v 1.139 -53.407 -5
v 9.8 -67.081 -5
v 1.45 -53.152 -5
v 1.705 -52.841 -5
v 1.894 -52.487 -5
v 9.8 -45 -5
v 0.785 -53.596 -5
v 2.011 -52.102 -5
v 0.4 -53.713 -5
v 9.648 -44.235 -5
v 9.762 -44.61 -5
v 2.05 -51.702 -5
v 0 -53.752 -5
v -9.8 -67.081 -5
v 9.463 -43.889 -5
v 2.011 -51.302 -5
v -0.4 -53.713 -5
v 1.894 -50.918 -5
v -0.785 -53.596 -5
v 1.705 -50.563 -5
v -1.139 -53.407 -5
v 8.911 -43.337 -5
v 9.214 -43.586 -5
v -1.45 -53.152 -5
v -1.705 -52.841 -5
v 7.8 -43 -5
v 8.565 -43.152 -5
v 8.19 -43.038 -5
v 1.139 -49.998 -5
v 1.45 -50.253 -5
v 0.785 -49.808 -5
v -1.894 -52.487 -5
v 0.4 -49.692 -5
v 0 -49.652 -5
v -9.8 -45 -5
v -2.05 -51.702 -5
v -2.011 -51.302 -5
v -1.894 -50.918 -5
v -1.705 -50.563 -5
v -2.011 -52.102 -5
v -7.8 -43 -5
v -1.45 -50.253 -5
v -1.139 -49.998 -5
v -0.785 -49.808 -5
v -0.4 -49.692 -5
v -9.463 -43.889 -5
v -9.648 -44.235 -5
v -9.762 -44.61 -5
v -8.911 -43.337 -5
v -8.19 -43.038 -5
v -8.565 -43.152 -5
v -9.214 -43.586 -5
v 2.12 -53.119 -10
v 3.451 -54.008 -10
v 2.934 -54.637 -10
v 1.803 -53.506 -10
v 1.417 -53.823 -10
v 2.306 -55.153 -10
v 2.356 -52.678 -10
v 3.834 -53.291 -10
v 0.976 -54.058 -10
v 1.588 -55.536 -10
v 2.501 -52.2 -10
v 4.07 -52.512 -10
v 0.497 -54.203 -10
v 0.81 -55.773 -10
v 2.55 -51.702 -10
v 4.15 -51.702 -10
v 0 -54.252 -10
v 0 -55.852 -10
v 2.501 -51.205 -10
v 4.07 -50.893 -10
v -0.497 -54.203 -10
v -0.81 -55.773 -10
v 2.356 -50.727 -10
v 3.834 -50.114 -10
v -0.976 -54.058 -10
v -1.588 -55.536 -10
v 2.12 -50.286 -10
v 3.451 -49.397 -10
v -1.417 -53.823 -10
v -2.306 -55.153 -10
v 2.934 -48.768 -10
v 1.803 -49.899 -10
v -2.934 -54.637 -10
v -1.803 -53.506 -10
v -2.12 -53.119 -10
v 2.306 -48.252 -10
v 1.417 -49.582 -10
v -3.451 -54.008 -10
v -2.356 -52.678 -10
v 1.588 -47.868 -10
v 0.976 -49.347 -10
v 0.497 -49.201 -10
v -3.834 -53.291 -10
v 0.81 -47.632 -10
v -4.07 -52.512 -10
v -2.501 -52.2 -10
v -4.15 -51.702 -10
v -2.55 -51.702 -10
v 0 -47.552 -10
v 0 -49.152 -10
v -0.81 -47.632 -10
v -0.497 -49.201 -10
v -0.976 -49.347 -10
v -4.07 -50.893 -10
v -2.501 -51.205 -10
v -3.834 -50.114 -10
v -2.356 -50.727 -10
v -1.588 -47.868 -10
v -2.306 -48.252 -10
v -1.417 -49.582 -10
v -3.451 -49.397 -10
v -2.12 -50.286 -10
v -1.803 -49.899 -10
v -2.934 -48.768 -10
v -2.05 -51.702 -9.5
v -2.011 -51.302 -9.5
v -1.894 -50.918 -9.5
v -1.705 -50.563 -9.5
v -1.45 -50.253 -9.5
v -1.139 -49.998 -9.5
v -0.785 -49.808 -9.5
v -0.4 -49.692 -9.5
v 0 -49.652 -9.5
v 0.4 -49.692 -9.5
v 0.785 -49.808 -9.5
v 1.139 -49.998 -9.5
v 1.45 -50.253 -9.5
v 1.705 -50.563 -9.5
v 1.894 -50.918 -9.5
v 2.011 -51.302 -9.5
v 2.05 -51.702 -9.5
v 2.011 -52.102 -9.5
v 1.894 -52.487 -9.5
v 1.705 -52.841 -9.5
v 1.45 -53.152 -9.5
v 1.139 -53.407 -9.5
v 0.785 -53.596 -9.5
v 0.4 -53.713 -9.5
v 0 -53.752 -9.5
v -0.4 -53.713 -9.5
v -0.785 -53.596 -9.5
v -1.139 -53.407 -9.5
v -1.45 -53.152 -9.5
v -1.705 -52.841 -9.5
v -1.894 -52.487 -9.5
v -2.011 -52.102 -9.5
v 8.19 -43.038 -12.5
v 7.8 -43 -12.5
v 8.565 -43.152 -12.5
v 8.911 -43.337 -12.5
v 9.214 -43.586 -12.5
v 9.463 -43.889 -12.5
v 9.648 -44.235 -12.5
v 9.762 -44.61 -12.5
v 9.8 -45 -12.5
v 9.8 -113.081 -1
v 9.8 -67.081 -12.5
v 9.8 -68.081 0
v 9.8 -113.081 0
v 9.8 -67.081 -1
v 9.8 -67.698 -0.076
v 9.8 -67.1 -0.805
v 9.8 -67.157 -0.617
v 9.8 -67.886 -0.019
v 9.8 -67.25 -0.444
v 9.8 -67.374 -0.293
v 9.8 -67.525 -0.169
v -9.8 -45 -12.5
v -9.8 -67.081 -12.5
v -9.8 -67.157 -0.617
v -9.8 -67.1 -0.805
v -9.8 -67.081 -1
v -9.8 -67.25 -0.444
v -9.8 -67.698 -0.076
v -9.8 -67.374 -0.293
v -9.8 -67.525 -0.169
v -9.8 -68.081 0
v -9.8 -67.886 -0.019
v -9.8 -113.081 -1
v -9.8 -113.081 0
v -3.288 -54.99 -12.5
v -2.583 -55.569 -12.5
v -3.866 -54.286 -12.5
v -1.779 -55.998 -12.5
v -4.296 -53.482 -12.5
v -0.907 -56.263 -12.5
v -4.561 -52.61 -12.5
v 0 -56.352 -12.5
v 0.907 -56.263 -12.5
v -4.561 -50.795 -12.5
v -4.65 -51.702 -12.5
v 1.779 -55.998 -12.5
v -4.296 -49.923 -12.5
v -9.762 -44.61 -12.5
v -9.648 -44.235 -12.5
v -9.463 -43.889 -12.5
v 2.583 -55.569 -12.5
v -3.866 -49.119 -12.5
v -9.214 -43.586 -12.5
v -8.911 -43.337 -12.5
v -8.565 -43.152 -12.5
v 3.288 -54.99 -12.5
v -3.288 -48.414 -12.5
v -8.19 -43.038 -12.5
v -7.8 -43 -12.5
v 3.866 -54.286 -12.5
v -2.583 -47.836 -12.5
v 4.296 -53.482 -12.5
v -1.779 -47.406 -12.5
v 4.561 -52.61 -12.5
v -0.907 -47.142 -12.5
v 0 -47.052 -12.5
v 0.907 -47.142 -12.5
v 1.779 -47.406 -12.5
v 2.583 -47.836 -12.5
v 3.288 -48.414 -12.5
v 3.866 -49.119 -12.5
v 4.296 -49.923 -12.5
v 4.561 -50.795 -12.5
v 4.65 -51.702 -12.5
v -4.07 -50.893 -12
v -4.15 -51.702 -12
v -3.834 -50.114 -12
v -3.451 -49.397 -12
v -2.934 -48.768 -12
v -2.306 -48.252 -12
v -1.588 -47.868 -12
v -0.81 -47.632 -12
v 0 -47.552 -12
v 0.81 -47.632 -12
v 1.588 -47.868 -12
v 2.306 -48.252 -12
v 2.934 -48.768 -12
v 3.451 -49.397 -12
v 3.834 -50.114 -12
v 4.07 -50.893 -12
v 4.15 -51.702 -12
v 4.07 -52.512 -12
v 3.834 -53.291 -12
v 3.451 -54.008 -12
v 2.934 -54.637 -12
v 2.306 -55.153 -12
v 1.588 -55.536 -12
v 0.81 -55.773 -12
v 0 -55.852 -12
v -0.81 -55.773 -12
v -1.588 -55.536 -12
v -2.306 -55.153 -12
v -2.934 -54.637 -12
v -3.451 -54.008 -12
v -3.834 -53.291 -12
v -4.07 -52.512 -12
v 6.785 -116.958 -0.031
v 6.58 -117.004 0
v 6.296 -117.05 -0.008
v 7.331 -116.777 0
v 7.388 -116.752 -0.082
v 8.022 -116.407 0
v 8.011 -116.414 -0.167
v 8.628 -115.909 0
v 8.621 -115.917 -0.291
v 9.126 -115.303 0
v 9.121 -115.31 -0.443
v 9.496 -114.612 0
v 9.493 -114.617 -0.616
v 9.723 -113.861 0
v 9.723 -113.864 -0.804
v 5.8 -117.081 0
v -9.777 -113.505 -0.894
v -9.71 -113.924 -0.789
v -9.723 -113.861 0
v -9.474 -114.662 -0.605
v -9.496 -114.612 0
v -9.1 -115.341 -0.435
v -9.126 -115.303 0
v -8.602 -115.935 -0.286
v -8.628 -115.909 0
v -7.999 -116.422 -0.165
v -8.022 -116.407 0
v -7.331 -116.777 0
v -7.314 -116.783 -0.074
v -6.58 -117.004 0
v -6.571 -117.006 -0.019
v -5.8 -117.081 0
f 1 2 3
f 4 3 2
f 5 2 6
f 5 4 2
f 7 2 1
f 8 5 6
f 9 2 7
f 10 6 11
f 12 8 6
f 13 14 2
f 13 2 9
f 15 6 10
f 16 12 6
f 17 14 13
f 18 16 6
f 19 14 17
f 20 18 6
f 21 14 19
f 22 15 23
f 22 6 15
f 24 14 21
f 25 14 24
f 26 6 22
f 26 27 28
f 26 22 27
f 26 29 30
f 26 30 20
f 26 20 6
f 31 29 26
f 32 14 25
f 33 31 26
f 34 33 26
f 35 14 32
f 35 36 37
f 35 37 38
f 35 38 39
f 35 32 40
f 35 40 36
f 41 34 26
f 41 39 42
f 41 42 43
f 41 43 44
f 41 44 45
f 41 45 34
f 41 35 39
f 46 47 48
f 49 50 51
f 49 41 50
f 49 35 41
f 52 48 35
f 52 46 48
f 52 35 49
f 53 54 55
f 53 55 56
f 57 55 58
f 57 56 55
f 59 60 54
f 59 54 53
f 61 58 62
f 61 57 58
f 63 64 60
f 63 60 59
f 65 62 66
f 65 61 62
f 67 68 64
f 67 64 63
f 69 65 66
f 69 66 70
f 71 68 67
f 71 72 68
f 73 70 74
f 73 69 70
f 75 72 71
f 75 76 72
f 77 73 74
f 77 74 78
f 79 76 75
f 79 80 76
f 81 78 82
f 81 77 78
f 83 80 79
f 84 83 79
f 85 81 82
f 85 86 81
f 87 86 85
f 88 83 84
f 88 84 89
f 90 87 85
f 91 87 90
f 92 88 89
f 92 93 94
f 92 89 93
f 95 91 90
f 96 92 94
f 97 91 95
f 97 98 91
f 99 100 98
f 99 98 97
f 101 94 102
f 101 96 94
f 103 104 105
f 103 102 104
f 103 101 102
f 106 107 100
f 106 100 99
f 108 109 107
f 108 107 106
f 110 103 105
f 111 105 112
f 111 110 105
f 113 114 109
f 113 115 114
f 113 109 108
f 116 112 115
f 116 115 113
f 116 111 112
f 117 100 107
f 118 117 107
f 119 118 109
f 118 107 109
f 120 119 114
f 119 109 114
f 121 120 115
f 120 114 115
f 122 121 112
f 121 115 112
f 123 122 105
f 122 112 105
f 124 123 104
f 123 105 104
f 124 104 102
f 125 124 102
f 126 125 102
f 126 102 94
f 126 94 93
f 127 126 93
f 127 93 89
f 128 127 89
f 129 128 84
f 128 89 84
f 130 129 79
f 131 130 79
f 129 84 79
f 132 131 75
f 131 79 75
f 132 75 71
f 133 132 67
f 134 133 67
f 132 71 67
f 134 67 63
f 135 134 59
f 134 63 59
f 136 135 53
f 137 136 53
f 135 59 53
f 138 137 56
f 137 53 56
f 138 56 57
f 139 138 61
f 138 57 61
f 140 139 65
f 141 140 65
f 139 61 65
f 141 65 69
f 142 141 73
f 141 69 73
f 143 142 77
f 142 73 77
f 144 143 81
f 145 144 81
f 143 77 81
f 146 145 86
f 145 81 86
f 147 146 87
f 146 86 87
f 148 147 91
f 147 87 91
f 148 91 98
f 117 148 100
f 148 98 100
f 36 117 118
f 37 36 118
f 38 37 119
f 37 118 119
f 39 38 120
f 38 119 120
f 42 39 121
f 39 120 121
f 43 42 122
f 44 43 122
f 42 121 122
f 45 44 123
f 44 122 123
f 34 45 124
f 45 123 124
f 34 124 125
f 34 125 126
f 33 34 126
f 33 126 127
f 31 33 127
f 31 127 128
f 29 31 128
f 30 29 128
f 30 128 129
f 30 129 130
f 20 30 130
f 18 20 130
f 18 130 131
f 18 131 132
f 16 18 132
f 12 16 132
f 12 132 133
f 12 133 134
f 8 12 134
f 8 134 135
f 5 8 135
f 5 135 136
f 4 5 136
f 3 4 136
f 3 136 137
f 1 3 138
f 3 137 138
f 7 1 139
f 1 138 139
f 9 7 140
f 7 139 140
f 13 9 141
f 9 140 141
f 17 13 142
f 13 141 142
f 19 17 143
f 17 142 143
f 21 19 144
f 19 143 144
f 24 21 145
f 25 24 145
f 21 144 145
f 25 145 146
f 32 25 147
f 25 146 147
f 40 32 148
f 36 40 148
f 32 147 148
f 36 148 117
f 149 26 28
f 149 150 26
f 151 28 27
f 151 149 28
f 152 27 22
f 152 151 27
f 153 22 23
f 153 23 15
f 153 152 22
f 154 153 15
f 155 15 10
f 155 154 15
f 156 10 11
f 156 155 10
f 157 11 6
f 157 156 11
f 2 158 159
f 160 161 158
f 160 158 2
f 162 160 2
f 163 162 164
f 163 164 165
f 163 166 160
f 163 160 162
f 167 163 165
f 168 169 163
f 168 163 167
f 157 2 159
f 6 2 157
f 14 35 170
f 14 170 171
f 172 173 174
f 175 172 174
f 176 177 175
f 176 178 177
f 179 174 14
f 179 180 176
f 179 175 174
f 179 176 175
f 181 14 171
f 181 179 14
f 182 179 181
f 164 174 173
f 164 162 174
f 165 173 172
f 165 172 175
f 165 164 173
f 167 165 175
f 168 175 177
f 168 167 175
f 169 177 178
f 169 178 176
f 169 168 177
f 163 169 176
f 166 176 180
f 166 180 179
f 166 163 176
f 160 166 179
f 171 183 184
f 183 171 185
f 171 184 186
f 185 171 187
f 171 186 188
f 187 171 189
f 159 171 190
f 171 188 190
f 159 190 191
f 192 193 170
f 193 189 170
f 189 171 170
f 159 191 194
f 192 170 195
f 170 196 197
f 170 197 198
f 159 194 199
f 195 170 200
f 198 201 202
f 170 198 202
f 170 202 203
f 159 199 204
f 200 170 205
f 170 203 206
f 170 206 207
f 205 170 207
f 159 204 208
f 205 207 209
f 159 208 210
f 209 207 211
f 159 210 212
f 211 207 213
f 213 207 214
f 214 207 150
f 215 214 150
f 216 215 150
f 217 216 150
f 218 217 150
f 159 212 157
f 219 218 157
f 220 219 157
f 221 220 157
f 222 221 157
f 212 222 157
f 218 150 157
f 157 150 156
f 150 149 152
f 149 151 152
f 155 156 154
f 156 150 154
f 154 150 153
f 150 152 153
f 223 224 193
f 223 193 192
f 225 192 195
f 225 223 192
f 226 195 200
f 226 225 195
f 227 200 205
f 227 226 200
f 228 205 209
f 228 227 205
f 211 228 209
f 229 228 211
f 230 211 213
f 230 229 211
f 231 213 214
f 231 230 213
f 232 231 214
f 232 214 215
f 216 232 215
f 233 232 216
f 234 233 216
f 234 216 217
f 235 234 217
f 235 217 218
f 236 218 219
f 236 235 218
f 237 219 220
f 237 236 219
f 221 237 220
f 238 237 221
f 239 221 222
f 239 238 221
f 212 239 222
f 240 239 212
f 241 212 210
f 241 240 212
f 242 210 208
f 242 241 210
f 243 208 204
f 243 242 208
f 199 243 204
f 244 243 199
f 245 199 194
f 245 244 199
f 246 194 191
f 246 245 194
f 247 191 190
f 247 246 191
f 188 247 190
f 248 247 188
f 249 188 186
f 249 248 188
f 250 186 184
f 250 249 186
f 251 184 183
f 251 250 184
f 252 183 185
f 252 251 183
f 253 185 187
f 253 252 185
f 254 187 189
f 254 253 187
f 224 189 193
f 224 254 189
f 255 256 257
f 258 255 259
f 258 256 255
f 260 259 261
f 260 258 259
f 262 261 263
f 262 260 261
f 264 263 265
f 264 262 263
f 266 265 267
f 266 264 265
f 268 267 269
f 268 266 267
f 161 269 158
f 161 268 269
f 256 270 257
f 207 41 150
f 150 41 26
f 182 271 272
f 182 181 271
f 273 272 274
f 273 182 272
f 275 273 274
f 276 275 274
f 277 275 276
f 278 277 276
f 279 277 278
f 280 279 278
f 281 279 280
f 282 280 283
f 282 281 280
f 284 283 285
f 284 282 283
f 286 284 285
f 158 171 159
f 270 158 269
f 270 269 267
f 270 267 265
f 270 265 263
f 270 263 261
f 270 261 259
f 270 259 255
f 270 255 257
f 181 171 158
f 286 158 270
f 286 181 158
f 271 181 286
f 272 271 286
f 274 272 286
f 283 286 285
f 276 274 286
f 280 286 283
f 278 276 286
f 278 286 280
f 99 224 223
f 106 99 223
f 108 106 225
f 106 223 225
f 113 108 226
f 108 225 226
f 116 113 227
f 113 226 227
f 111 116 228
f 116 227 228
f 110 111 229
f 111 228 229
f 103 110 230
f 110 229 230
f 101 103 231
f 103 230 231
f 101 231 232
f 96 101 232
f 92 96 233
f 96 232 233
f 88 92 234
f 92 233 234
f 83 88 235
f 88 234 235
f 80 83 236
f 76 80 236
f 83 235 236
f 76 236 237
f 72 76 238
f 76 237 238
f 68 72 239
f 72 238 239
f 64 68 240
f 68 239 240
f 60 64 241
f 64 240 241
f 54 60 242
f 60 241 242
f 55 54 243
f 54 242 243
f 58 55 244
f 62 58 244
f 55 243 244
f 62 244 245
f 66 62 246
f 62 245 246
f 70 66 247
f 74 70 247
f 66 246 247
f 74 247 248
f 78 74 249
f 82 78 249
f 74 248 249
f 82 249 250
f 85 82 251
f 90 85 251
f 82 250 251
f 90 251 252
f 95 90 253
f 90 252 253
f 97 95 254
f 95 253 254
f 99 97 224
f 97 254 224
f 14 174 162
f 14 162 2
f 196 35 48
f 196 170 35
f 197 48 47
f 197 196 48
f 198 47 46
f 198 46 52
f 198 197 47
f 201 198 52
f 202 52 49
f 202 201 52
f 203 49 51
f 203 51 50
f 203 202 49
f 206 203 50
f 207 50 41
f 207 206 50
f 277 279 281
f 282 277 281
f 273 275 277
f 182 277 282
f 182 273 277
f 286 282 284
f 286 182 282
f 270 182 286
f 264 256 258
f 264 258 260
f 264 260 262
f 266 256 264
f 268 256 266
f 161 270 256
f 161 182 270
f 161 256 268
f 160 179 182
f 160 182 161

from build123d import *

# Parameters (mm, degrees)
BOSS_EXTRUDE1_DEPTH = 12.5
CUT_EXTRUDE1_REACH  = 121.367
SKETCH2_W           = 5
SKETCH2_H           = 24.080992435
CUT_EXTRUDE2_REACH  = 120.153
SKETCH3_R           = 2.05
FILLET1_R           = 2
FILLET2_R           = 1
SKETCH4_R           = 4.15
CUT_EXTRUDE3_DEPTH  = 2.5
CHAMFER1_SIZE       = 0.5


with BuildPart() as part:
    # Sketch1 → Boss-Extrude1 (new body)
    with BuildSketch(Plane.XY):
        with BuildLine():
            Line((9.8, -43), (-9.8, -43))
            Line((-9.8, -43), (-9.8, -113.080992435))
            ThreePointArc((-9.8, -113.080992435), (-8.628427125, -115.90941956), (-5.8, -117.080992435))
            Line((-5.8, -117.080992435), (5.8, -117.080992435))
            ThreePointArc((5.8, -117.080992435), (8.628427125, -115.90941956), (9.8, -113.080992435))
            Line((9.8, -113.080992435), (9.8, -43))
        make_face()
    extrude(amount=-BOSS_EXTRUDE1_DEPTH)

    # Sketch2 → Cut-Extrude1 (cut, up to next)
    with BuildSketch(Plane(origin=(9.8, 0, 0), x_dir=(0, 0, -1), z_dir=(1, 0, 0)), mode=Mode.PRIVATE) as cut_extrude1_sk1:
        with Locations((2.5, -55.040496217)):
            Rectangle(SKETCH2_W, SKETCH2_H)
    cut_extrude1_tool1 = extrude(cut_extrude1_sk1.sketch, amount=-CUT_EXTRUDE1_REACH, mode=Mode.PRIVATE) & part.part
    # Sketch2 → Cut-Extrude1 (cut, up to next)
    with BuildSketch(Plane(origin=(9.8, 0, 0), x_dir=(0, 0, -1), z_dir=(1, 0, 0)), mode=Mode.PRIVATE) as cut_extrude1_sk2:
        Polygon((12.5, -67.080992435), (0, -117.080992435), (12.5, -117.080992435), align=None)
    cut_extrude1_tool2 = extrude(cut_extrude1_sk2.sketch, amount=-CUT_EXTRUDE1_REACH, mode=Mode.PRIVATE) & part.part
    add(cut_extrude1_tool1.solids().sort_by_distance((9.8, -55.040496, -2.5))[0], mode=Mode.SUBTRACT)
    add(cut_extrude1_tool2.solids().sort_by_distance((9.8, -100.414326, -8.333333))[0], mode=Mode.SUBTRACT)

    # Sketch3 → Cut-Extrude2 (cut, up to next)
    with BuildSketch(Plane(origin=(0, 0, -12.5), x_dir=(-1, 0, 0), z_dir=(0, 0, -1)), mode=Mode.PRIVATE) as cut_extrude2_sk1:
        with Locations((0, -51.702394739)):
            Circle(SKETCH3_R)
    cut_extrude2_tool1 = extrude(cut_extrude2_sk1.sketch, amount=-CUT_EXTRUDE2_REACH, mode=Mode.PRIVATE) & part.part
    add(cut_extrude2_tool1.solids().sort_by_distance((0, -51.702395, -12.5))[0], mode=Mode.SUBTRACT)

    # Fillet1
    fillet1_edges = [part.edges().sort_by_distance(p)[0] for p in [
        (9.8, -43, -8.75),
        (-9.8, -43, -8.75),
    ]]
    fillet(fillet1_edges, radius=FILLET1_R)

    # Fillet2
    fillet2_edges = [part.edges().sort_by_distance(p)[0] for p in [
        (0, -67.080992435, 0),
    ]]
    fillet(fillet2_edges, radius=FILLET2_R)

    # Sketch4 → Cut-Extrude3 (cut)
    with BuildSketch(Plane(origin=(0, 0, -12.5), x_dir=(-1, 0, 0), z_dir=(0, 0, -1))):
        with Locations((0, -51.702394739)):
            Circle(SKETCH4_R)
    extrude(amount=-CUT_EXTRUDE3_DEPTH, mode=Mode.SUBTRACT)

    # Chamfer1
    chamfer1_edges = [part.edges().sort_by_distance(p)[0] for p in [
        (2.05, -51.702394739, -10),
        (4.15, -51.702394739, -12.5),
    ]]
    chamfer(chamfer1_edges, length=CHAMFER1_SIZE)


solid = part.part
